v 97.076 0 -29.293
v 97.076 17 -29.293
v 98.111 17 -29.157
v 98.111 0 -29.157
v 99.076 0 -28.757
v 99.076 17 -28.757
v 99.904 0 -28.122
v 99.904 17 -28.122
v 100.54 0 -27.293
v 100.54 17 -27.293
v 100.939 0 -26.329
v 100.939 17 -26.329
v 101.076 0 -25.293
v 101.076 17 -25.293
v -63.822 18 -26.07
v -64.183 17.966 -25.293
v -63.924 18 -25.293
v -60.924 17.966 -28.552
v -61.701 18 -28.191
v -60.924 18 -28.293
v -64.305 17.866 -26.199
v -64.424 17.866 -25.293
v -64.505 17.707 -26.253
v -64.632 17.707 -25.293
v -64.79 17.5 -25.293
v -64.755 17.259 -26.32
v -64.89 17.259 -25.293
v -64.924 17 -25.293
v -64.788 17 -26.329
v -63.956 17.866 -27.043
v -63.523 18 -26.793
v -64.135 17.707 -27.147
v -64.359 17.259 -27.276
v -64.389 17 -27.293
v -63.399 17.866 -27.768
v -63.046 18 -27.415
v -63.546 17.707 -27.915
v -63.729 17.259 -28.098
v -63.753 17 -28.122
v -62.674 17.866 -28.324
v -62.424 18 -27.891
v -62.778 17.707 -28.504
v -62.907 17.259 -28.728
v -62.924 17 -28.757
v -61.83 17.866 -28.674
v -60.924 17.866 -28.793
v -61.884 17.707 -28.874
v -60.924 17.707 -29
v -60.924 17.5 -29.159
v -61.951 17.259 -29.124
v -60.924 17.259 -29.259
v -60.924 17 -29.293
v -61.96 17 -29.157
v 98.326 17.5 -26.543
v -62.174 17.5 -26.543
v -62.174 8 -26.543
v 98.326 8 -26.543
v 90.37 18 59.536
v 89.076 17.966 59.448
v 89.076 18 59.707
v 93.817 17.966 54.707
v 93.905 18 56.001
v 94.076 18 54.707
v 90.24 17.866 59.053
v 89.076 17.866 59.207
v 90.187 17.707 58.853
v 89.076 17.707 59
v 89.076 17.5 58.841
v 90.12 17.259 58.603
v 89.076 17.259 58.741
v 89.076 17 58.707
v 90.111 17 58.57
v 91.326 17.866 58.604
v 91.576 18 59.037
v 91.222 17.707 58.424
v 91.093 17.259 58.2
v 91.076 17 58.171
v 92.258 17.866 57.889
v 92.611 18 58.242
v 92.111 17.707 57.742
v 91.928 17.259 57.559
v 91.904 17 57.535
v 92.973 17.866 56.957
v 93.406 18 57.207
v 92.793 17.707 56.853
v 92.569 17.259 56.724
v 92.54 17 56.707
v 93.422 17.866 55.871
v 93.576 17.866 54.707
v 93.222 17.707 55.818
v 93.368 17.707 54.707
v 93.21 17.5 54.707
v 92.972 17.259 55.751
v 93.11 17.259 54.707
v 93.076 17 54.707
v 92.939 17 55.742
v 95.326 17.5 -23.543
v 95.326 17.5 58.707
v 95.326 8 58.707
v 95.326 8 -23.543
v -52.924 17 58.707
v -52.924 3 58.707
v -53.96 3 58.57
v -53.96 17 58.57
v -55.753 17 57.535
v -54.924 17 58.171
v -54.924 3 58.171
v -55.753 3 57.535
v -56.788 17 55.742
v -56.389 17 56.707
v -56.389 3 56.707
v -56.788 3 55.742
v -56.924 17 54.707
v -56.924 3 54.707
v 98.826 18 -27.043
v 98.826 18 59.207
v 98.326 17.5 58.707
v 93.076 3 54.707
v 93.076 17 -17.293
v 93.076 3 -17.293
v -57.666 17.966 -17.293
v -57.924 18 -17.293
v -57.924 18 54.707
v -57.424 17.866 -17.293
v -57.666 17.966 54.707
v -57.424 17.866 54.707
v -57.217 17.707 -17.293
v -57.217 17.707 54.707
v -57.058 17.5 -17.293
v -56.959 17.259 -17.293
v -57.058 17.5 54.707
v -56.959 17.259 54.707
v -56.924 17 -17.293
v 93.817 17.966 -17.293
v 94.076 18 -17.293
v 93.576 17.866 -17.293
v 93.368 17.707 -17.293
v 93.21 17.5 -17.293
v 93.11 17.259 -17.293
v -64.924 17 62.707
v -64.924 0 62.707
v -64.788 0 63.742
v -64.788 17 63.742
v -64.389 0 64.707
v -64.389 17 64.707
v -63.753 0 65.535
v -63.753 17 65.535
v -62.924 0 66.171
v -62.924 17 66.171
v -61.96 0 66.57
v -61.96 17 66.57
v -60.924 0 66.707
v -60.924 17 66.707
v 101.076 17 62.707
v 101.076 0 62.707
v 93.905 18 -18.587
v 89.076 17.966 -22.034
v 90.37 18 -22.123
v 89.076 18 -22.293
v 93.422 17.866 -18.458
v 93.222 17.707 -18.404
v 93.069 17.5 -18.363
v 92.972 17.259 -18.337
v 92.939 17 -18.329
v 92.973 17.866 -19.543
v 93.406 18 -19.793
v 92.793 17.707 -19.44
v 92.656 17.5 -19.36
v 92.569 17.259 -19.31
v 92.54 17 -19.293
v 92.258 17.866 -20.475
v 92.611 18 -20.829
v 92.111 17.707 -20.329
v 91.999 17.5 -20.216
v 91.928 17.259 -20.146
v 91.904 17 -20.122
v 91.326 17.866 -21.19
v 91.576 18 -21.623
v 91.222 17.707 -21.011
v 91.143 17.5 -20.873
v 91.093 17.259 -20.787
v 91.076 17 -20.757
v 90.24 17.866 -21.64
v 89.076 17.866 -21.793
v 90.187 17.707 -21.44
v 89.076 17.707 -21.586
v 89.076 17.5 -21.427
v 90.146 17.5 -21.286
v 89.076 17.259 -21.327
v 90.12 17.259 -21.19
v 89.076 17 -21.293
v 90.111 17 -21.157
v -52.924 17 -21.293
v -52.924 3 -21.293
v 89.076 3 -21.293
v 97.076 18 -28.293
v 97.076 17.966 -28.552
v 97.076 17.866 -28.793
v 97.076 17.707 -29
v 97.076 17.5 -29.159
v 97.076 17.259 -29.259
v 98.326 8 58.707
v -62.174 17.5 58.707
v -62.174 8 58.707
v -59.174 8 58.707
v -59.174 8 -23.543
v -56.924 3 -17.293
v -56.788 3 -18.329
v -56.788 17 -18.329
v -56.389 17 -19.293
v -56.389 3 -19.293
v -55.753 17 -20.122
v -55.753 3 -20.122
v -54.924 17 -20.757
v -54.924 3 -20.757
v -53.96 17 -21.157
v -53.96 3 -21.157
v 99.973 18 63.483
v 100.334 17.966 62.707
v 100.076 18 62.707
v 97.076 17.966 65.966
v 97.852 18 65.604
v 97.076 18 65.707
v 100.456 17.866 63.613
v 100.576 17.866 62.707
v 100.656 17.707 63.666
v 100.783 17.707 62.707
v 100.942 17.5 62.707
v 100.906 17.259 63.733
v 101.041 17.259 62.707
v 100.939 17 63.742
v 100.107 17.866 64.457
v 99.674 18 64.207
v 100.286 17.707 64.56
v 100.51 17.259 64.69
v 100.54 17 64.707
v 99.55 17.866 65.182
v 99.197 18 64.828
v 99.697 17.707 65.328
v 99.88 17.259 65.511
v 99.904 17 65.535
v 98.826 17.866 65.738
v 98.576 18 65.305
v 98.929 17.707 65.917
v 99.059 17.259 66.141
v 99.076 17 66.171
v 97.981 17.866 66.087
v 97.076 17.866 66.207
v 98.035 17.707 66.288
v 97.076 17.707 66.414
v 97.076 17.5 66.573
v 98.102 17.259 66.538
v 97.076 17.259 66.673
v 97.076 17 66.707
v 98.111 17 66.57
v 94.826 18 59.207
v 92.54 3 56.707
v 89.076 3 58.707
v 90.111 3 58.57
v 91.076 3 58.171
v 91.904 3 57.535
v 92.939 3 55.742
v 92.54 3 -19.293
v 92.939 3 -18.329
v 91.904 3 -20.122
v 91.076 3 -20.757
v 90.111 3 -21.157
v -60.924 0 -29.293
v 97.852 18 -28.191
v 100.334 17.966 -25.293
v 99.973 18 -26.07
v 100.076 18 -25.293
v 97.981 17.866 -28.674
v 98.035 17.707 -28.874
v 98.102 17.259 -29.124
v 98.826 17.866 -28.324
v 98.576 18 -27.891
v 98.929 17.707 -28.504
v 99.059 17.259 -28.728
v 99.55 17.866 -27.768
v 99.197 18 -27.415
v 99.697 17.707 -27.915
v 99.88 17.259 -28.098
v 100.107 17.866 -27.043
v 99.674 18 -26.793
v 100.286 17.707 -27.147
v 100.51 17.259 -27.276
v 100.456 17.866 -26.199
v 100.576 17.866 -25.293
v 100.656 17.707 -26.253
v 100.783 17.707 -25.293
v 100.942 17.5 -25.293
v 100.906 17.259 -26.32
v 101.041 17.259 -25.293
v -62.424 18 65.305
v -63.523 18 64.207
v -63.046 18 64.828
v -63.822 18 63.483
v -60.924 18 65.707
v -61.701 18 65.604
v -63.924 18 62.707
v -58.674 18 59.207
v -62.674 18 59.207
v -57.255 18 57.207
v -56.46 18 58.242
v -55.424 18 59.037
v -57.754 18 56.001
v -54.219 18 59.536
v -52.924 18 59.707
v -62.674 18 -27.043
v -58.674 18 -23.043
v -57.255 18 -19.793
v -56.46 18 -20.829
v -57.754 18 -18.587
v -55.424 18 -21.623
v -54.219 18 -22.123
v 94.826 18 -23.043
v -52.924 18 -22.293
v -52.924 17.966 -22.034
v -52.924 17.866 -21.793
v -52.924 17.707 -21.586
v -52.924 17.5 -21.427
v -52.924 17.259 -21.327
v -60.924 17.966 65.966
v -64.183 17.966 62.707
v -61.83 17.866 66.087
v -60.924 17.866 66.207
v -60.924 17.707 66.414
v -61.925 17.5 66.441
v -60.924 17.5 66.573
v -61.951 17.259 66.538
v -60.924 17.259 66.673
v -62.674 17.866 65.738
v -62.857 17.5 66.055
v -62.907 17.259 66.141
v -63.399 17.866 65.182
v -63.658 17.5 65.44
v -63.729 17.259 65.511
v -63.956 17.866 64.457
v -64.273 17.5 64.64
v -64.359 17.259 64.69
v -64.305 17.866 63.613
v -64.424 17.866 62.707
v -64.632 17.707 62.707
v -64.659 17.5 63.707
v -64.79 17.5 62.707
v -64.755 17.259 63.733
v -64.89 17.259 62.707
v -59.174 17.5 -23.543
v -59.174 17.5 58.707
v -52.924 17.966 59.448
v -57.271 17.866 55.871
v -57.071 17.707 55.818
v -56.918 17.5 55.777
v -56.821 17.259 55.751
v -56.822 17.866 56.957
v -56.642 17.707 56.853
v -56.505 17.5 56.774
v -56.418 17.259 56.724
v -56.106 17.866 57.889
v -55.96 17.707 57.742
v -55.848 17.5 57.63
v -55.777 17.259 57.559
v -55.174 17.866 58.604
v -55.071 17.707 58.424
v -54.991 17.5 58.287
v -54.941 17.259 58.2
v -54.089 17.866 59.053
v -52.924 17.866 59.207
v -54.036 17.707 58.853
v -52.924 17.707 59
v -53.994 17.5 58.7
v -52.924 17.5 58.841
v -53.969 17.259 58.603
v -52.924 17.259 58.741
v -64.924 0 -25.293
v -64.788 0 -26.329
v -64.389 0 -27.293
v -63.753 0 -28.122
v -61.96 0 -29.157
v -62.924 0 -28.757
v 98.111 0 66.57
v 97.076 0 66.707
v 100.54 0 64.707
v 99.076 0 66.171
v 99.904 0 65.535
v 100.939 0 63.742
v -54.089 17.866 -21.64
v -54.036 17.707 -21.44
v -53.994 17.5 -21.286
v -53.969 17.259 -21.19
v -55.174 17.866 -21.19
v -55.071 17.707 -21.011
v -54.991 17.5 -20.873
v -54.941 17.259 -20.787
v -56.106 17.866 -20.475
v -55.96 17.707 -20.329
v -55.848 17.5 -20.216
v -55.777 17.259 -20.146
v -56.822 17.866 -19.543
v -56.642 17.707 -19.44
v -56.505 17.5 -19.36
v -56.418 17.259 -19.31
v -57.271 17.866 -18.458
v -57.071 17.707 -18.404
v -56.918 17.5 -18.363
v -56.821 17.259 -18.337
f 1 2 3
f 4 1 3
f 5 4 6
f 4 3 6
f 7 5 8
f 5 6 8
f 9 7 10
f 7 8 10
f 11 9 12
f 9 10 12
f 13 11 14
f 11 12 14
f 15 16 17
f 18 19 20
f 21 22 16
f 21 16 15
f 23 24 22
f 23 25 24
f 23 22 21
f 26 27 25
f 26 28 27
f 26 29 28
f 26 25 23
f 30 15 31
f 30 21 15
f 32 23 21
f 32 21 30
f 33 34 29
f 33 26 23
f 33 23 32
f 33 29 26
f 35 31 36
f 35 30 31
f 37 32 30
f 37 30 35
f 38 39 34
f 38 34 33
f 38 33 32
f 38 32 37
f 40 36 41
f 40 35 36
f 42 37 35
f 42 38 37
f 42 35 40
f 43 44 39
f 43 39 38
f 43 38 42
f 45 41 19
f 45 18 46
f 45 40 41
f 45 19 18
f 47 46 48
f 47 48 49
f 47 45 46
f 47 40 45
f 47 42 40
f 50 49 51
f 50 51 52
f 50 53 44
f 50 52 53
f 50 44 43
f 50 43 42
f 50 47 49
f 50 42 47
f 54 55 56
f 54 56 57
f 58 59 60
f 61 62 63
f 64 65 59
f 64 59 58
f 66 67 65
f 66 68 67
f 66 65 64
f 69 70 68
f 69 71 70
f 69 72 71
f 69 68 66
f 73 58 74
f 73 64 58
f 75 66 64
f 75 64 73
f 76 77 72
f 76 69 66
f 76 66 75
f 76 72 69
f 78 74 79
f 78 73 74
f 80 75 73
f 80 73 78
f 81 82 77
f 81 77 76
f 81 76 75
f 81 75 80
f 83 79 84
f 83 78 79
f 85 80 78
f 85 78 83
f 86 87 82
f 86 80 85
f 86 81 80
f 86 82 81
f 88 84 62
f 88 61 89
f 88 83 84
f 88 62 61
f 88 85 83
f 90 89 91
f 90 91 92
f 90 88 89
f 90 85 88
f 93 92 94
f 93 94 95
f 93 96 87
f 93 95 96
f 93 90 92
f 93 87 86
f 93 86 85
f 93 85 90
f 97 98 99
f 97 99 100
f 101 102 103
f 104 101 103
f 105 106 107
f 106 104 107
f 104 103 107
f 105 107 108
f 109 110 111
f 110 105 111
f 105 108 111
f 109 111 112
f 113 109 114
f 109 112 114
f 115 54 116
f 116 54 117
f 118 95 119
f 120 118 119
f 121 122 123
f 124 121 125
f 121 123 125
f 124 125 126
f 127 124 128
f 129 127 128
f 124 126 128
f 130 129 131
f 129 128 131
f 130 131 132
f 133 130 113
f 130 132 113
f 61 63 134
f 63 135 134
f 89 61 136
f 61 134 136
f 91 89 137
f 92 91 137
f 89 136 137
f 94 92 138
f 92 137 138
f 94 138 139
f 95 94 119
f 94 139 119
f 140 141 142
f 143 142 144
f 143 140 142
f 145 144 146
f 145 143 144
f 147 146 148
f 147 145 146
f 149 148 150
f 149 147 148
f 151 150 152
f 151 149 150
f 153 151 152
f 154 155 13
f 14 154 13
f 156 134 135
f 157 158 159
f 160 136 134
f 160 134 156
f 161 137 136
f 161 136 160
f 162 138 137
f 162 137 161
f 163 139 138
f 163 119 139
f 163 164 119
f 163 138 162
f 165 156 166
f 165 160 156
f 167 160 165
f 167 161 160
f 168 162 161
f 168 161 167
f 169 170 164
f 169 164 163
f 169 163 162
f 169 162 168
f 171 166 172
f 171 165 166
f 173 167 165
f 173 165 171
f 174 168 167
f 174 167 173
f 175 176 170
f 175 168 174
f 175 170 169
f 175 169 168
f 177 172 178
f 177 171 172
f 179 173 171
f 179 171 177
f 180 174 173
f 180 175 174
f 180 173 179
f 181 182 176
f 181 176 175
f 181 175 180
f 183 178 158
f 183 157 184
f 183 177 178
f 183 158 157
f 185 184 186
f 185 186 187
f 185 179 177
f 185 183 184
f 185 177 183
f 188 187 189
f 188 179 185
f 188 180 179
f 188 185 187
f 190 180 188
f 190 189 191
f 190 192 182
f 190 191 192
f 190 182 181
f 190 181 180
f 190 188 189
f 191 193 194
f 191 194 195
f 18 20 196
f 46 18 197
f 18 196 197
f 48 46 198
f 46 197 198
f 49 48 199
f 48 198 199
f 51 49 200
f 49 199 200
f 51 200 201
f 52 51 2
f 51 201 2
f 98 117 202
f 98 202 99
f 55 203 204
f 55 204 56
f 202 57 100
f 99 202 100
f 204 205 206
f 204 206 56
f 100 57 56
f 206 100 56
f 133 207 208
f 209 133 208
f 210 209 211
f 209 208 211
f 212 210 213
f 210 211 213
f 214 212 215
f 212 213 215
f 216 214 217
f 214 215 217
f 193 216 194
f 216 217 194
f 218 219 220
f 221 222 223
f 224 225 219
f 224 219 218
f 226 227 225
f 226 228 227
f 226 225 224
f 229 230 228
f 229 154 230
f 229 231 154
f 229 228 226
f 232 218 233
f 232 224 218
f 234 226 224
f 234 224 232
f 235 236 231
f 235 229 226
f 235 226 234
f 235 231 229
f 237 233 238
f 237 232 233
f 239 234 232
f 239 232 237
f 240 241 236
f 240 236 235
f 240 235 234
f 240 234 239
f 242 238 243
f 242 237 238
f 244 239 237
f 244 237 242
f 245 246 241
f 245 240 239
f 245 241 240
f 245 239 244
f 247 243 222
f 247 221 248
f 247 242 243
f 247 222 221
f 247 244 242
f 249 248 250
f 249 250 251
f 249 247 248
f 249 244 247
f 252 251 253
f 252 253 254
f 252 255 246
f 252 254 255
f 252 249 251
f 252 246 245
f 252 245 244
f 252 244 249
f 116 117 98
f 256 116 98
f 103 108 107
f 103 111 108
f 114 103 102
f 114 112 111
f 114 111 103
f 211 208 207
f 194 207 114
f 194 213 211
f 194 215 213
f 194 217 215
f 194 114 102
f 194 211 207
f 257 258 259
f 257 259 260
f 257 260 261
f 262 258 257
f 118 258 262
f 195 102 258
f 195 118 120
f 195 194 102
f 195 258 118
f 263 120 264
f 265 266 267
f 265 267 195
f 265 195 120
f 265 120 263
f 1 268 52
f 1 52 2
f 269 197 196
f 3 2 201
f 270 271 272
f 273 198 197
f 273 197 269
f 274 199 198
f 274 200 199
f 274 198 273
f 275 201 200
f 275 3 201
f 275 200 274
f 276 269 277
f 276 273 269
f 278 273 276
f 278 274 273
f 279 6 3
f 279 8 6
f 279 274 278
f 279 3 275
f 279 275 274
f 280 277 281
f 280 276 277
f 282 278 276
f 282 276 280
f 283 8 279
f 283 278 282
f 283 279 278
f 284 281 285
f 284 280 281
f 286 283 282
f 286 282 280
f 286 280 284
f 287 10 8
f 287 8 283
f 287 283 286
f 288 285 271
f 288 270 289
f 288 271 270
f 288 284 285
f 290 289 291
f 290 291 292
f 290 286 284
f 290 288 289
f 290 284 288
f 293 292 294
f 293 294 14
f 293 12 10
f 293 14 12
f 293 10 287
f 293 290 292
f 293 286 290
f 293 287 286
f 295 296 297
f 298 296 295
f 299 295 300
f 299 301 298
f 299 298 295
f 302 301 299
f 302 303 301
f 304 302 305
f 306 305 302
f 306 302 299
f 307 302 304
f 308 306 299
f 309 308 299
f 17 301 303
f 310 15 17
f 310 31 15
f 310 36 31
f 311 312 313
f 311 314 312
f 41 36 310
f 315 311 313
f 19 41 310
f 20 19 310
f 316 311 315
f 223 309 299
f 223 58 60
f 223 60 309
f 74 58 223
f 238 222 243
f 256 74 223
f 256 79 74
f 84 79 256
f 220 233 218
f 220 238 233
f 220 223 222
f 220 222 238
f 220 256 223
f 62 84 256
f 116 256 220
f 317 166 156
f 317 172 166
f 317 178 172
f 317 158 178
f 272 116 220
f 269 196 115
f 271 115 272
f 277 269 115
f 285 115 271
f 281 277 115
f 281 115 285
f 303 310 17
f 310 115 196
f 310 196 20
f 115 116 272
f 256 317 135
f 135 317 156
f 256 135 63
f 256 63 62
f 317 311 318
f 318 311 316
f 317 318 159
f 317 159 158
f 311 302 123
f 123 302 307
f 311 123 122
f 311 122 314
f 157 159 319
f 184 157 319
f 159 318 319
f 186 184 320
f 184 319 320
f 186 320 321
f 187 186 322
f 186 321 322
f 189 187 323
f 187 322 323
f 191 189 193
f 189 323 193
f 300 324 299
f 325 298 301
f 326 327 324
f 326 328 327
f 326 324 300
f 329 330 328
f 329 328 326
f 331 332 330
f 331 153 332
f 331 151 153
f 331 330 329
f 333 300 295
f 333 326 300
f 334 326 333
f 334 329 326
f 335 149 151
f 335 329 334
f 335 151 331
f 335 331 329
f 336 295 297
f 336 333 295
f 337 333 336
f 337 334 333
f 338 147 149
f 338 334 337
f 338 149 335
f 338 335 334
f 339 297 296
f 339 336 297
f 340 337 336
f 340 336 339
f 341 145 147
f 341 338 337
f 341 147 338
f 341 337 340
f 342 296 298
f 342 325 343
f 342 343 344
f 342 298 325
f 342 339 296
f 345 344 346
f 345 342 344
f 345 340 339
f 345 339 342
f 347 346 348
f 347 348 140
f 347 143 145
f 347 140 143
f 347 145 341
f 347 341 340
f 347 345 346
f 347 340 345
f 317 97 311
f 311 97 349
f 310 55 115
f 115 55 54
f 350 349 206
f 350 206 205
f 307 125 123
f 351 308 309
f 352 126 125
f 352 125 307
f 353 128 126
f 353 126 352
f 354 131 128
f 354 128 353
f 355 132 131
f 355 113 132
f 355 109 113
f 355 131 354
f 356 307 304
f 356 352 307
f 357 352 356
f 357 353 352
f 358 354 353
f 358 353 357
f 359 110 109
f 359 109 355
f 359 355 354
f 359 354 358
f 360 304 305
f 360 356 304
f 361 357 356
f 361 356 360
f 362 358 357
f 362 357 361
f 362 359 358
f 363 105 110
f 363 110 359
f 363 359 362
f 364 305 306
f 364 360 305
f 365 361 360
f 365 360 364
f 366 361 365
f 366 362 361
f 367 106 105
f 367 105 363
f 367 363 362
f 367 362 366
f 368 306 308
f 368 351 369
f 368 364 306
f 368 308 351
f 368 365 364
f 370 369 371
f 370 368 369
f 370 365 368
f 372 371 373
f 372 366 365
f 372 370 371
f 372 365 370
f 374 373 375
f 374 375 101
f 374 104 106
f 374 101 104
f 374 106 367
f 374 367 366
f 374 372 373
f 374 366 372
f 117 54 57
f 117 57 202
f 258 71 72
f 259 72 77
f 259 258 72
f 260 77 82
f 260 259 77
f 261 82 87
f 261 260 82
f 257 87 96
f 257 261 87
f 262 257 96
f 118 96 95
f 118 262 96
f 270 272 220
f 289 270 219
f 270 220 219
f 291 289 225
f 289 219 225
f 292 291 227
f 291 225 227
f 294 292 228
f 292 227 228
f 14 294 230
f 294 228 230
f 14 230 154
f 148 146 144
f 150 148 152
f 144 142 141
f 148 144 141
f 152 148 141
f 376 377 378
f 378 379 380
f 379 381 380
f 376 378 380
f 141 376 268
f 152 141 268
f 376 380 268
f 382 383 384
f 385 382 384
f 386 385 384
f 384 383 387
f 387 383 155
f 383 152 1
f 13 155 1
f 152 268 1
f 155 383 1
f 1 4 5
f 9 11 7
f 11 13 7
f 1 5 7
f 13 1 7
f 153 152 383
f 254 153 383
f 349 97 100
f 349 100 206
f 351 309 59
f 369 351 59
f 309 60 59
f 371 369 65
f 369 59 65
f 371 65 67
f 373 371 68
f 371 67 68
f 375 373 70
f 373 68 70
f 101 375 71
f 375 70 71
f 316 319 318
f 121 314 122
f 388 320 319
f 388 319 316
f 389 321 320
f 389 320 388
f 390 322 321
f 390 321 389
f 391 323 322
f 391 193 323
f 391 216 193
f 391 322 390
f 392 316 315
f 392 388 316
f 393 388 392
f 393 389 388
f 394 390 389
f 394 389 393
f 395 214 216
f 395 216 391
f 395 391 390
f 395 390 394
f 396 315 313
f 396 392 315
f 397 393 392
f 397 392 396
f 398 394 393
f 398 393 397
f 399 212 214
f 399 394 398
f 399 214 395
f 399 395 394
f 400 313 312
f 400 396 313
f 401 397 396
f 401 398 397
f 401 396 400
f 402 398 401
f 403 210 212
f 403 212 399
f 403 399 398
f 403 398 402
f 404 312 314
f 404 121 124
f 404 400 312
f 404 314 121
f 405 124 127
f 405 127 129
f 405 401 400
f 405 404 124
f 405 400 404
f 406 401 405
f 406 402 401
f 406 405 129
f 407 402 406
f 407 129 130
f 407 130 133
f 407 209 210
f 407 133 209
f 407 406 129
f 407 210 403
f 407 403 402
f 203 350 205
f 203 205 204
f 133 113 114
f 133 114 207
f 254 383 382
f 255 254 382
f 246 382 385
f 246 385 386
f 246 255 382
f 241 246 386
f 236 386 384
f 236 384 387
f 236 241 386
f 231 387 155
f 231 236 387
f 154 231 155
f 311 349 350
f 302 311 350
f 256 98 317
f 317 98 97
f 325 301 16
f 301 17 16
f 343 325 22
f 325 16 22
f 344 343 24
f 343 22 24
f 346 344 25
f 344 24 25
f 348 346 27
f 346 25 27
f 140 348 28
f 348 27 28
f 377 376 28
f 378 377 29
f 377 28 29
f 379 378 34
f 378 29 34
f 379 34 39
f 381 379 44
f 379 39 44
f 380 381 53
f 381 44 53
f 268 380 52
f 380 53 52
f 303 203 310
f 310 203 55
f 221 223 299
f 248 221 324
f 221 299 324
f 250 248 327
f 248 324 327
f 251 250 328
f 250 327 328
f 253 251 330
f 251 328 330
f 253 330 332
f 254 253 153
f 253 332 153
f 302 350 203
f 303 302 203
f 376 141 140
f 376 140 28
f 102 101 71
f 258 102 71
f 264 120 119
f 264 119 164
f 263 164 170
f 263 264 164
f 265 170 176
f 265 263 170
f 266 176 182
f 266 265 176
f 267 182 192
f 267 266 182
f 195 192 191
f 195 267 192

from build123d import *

# Parameters (mm, degrees)
SKETCH1_W           = 166
SKETCH1_H           = 96
BOSS_EXTRUDE1_DEPTH = 18
SKETCH2_W           = 150
SKETCH2_H           = 80
CUT_EXTRUDE1_DEPTH  = 15
CUT_EXTRUDE5_DEPTH  = 10
FILLET1_R           = 4
FILLET2_R           = 4
FILLET5_R           = 1
CHAMFER1_SIZE       = 0.5


with BuildPart() as part:
    # Sketch1 → Boss-Extrude1 (new body)
    with BuildSketch(Plane(origin=(0, 0, 0), x_dir=(1, 0, 0), z_dir=(0, 1, 0))):
        with Locations((18.075570249, -18.706715624)):
            Rectangle(SKETCH1_W, SKETCH1_H)
    extrude(amount=BOSS_EXTRUDE1_DEPTH)

    # Sketch2 → Cut-Extrude1 (cut)
    with BuildSketch(Plane(origin=(0, 18, 0), x_dir=(1, 0, 0), z_dir=(0, 1, 0))):
        with Locations((18.075570249, -18.706715624)):
            Rectangle(SKETCH2_W, SKETCH2_H)
    extrude(amount=-CUT_EXTRUDE1_DEPTH, mode=Mode.SUBTRACT)

    # Sketch9 → Cut-Extrude5 (cut)
    with BuildSketch(Plane(origin=(0, 18, 0), x_dir=(1, 0, 0), z_dir=(0, 1, 0))):
        Polygon((-62.174429751, 26.543284376), (98.325570249, 26.543284376), (98.325570249, -58.706715624), (95.325570249, -58.706715624), (95.325570249, 23.543284376), (-59.174429751, 23.543284376), (-59.174429751, -58.706715624), (-62.174429751, -58.706715624), align=None)
    extrude(amount=-CUT_EXTRUDE5_DEPTH, mode=Mode.SUBTRACT)

    # Fillet1
    fillet1_edges = [part.edges().sort_by_distance(p)[0] for p in [
        (-64.924429751, 9, -29.293284376),
        (101.075570249, 9, -29.293284376),
        (101.075570249, 9, 66.706715624),
        (-64.924429751, 9, 66.706715624),
    ]]
    fillet(fillet1_edges, radius=FILLET1_R)

    # Fillet2
    fillet2_edges = [part.edges().sort_by_distance(p)[0] for p in [
        (-56.924429751, 10.5, 58.706715624),
        (-56.924429751, 10.5, -21.293284376),
        (93.075570249, 10.5, -21.293284376),
        (93.075570249, 10.5, 58.706715624),
    ]]
    fillet(fillet2_edges, radius=FILLET2_R)

    # Fillet5
    fillet5_edges = [part.edges().sort_by_distance(p)[0] for p in [
        (-64.924429751, 18, 18.706715624),
        (18.075570249, 18, -29.293284376),
        (18.075570249, 18, 66.706715624),
        (101.075570249, 18, 18.706715624),
        (-63.752856875, 18, 65.535142749),
        (99.903997374, 18, 65.535142749),
        (99.903997374, 18, -28.1217115),
        (-63.752856875, 18, -28.1217115),
        (93.075570249, 18, 18.706715624),
        (18.075570249, 18, 58.706715624),
        (18.075570249, 18, -21.293284376),
        (-56.924429751, 18, 18.706715624),
        (91.903997374, 18, 57.535142749),
        (91.903997374, 18, -20.1217115),
        (-55.752856875, 18, -20.1217115),
        (-55.752856875, 18, 57.535142749),
    ]]
    fillet(fillet5_edges, radius=FILLET5_R)

    # Chamfer1
    chamfer1_edges = [part.edges().sort_by_distance(p)[0] for p in [
        (-62.174429751, 18, 16.081715624),
        (-60.674429751, 18, 58.706715624),
        (-59.174429751, 18, 17.581715624),
        (18.075570249, 18, -23.543284376),
        (95.325570249, 18, 17.581715624),
        (96.825570249, 18, 58.706715624),
        (98.325570249, 18, 16.081715624),
        (18.075570249, 18, -26.543284376),
    ]]
    chamfer(chamfer1_edges, length=CHAMFER1_SIZE)


solid = part.part
